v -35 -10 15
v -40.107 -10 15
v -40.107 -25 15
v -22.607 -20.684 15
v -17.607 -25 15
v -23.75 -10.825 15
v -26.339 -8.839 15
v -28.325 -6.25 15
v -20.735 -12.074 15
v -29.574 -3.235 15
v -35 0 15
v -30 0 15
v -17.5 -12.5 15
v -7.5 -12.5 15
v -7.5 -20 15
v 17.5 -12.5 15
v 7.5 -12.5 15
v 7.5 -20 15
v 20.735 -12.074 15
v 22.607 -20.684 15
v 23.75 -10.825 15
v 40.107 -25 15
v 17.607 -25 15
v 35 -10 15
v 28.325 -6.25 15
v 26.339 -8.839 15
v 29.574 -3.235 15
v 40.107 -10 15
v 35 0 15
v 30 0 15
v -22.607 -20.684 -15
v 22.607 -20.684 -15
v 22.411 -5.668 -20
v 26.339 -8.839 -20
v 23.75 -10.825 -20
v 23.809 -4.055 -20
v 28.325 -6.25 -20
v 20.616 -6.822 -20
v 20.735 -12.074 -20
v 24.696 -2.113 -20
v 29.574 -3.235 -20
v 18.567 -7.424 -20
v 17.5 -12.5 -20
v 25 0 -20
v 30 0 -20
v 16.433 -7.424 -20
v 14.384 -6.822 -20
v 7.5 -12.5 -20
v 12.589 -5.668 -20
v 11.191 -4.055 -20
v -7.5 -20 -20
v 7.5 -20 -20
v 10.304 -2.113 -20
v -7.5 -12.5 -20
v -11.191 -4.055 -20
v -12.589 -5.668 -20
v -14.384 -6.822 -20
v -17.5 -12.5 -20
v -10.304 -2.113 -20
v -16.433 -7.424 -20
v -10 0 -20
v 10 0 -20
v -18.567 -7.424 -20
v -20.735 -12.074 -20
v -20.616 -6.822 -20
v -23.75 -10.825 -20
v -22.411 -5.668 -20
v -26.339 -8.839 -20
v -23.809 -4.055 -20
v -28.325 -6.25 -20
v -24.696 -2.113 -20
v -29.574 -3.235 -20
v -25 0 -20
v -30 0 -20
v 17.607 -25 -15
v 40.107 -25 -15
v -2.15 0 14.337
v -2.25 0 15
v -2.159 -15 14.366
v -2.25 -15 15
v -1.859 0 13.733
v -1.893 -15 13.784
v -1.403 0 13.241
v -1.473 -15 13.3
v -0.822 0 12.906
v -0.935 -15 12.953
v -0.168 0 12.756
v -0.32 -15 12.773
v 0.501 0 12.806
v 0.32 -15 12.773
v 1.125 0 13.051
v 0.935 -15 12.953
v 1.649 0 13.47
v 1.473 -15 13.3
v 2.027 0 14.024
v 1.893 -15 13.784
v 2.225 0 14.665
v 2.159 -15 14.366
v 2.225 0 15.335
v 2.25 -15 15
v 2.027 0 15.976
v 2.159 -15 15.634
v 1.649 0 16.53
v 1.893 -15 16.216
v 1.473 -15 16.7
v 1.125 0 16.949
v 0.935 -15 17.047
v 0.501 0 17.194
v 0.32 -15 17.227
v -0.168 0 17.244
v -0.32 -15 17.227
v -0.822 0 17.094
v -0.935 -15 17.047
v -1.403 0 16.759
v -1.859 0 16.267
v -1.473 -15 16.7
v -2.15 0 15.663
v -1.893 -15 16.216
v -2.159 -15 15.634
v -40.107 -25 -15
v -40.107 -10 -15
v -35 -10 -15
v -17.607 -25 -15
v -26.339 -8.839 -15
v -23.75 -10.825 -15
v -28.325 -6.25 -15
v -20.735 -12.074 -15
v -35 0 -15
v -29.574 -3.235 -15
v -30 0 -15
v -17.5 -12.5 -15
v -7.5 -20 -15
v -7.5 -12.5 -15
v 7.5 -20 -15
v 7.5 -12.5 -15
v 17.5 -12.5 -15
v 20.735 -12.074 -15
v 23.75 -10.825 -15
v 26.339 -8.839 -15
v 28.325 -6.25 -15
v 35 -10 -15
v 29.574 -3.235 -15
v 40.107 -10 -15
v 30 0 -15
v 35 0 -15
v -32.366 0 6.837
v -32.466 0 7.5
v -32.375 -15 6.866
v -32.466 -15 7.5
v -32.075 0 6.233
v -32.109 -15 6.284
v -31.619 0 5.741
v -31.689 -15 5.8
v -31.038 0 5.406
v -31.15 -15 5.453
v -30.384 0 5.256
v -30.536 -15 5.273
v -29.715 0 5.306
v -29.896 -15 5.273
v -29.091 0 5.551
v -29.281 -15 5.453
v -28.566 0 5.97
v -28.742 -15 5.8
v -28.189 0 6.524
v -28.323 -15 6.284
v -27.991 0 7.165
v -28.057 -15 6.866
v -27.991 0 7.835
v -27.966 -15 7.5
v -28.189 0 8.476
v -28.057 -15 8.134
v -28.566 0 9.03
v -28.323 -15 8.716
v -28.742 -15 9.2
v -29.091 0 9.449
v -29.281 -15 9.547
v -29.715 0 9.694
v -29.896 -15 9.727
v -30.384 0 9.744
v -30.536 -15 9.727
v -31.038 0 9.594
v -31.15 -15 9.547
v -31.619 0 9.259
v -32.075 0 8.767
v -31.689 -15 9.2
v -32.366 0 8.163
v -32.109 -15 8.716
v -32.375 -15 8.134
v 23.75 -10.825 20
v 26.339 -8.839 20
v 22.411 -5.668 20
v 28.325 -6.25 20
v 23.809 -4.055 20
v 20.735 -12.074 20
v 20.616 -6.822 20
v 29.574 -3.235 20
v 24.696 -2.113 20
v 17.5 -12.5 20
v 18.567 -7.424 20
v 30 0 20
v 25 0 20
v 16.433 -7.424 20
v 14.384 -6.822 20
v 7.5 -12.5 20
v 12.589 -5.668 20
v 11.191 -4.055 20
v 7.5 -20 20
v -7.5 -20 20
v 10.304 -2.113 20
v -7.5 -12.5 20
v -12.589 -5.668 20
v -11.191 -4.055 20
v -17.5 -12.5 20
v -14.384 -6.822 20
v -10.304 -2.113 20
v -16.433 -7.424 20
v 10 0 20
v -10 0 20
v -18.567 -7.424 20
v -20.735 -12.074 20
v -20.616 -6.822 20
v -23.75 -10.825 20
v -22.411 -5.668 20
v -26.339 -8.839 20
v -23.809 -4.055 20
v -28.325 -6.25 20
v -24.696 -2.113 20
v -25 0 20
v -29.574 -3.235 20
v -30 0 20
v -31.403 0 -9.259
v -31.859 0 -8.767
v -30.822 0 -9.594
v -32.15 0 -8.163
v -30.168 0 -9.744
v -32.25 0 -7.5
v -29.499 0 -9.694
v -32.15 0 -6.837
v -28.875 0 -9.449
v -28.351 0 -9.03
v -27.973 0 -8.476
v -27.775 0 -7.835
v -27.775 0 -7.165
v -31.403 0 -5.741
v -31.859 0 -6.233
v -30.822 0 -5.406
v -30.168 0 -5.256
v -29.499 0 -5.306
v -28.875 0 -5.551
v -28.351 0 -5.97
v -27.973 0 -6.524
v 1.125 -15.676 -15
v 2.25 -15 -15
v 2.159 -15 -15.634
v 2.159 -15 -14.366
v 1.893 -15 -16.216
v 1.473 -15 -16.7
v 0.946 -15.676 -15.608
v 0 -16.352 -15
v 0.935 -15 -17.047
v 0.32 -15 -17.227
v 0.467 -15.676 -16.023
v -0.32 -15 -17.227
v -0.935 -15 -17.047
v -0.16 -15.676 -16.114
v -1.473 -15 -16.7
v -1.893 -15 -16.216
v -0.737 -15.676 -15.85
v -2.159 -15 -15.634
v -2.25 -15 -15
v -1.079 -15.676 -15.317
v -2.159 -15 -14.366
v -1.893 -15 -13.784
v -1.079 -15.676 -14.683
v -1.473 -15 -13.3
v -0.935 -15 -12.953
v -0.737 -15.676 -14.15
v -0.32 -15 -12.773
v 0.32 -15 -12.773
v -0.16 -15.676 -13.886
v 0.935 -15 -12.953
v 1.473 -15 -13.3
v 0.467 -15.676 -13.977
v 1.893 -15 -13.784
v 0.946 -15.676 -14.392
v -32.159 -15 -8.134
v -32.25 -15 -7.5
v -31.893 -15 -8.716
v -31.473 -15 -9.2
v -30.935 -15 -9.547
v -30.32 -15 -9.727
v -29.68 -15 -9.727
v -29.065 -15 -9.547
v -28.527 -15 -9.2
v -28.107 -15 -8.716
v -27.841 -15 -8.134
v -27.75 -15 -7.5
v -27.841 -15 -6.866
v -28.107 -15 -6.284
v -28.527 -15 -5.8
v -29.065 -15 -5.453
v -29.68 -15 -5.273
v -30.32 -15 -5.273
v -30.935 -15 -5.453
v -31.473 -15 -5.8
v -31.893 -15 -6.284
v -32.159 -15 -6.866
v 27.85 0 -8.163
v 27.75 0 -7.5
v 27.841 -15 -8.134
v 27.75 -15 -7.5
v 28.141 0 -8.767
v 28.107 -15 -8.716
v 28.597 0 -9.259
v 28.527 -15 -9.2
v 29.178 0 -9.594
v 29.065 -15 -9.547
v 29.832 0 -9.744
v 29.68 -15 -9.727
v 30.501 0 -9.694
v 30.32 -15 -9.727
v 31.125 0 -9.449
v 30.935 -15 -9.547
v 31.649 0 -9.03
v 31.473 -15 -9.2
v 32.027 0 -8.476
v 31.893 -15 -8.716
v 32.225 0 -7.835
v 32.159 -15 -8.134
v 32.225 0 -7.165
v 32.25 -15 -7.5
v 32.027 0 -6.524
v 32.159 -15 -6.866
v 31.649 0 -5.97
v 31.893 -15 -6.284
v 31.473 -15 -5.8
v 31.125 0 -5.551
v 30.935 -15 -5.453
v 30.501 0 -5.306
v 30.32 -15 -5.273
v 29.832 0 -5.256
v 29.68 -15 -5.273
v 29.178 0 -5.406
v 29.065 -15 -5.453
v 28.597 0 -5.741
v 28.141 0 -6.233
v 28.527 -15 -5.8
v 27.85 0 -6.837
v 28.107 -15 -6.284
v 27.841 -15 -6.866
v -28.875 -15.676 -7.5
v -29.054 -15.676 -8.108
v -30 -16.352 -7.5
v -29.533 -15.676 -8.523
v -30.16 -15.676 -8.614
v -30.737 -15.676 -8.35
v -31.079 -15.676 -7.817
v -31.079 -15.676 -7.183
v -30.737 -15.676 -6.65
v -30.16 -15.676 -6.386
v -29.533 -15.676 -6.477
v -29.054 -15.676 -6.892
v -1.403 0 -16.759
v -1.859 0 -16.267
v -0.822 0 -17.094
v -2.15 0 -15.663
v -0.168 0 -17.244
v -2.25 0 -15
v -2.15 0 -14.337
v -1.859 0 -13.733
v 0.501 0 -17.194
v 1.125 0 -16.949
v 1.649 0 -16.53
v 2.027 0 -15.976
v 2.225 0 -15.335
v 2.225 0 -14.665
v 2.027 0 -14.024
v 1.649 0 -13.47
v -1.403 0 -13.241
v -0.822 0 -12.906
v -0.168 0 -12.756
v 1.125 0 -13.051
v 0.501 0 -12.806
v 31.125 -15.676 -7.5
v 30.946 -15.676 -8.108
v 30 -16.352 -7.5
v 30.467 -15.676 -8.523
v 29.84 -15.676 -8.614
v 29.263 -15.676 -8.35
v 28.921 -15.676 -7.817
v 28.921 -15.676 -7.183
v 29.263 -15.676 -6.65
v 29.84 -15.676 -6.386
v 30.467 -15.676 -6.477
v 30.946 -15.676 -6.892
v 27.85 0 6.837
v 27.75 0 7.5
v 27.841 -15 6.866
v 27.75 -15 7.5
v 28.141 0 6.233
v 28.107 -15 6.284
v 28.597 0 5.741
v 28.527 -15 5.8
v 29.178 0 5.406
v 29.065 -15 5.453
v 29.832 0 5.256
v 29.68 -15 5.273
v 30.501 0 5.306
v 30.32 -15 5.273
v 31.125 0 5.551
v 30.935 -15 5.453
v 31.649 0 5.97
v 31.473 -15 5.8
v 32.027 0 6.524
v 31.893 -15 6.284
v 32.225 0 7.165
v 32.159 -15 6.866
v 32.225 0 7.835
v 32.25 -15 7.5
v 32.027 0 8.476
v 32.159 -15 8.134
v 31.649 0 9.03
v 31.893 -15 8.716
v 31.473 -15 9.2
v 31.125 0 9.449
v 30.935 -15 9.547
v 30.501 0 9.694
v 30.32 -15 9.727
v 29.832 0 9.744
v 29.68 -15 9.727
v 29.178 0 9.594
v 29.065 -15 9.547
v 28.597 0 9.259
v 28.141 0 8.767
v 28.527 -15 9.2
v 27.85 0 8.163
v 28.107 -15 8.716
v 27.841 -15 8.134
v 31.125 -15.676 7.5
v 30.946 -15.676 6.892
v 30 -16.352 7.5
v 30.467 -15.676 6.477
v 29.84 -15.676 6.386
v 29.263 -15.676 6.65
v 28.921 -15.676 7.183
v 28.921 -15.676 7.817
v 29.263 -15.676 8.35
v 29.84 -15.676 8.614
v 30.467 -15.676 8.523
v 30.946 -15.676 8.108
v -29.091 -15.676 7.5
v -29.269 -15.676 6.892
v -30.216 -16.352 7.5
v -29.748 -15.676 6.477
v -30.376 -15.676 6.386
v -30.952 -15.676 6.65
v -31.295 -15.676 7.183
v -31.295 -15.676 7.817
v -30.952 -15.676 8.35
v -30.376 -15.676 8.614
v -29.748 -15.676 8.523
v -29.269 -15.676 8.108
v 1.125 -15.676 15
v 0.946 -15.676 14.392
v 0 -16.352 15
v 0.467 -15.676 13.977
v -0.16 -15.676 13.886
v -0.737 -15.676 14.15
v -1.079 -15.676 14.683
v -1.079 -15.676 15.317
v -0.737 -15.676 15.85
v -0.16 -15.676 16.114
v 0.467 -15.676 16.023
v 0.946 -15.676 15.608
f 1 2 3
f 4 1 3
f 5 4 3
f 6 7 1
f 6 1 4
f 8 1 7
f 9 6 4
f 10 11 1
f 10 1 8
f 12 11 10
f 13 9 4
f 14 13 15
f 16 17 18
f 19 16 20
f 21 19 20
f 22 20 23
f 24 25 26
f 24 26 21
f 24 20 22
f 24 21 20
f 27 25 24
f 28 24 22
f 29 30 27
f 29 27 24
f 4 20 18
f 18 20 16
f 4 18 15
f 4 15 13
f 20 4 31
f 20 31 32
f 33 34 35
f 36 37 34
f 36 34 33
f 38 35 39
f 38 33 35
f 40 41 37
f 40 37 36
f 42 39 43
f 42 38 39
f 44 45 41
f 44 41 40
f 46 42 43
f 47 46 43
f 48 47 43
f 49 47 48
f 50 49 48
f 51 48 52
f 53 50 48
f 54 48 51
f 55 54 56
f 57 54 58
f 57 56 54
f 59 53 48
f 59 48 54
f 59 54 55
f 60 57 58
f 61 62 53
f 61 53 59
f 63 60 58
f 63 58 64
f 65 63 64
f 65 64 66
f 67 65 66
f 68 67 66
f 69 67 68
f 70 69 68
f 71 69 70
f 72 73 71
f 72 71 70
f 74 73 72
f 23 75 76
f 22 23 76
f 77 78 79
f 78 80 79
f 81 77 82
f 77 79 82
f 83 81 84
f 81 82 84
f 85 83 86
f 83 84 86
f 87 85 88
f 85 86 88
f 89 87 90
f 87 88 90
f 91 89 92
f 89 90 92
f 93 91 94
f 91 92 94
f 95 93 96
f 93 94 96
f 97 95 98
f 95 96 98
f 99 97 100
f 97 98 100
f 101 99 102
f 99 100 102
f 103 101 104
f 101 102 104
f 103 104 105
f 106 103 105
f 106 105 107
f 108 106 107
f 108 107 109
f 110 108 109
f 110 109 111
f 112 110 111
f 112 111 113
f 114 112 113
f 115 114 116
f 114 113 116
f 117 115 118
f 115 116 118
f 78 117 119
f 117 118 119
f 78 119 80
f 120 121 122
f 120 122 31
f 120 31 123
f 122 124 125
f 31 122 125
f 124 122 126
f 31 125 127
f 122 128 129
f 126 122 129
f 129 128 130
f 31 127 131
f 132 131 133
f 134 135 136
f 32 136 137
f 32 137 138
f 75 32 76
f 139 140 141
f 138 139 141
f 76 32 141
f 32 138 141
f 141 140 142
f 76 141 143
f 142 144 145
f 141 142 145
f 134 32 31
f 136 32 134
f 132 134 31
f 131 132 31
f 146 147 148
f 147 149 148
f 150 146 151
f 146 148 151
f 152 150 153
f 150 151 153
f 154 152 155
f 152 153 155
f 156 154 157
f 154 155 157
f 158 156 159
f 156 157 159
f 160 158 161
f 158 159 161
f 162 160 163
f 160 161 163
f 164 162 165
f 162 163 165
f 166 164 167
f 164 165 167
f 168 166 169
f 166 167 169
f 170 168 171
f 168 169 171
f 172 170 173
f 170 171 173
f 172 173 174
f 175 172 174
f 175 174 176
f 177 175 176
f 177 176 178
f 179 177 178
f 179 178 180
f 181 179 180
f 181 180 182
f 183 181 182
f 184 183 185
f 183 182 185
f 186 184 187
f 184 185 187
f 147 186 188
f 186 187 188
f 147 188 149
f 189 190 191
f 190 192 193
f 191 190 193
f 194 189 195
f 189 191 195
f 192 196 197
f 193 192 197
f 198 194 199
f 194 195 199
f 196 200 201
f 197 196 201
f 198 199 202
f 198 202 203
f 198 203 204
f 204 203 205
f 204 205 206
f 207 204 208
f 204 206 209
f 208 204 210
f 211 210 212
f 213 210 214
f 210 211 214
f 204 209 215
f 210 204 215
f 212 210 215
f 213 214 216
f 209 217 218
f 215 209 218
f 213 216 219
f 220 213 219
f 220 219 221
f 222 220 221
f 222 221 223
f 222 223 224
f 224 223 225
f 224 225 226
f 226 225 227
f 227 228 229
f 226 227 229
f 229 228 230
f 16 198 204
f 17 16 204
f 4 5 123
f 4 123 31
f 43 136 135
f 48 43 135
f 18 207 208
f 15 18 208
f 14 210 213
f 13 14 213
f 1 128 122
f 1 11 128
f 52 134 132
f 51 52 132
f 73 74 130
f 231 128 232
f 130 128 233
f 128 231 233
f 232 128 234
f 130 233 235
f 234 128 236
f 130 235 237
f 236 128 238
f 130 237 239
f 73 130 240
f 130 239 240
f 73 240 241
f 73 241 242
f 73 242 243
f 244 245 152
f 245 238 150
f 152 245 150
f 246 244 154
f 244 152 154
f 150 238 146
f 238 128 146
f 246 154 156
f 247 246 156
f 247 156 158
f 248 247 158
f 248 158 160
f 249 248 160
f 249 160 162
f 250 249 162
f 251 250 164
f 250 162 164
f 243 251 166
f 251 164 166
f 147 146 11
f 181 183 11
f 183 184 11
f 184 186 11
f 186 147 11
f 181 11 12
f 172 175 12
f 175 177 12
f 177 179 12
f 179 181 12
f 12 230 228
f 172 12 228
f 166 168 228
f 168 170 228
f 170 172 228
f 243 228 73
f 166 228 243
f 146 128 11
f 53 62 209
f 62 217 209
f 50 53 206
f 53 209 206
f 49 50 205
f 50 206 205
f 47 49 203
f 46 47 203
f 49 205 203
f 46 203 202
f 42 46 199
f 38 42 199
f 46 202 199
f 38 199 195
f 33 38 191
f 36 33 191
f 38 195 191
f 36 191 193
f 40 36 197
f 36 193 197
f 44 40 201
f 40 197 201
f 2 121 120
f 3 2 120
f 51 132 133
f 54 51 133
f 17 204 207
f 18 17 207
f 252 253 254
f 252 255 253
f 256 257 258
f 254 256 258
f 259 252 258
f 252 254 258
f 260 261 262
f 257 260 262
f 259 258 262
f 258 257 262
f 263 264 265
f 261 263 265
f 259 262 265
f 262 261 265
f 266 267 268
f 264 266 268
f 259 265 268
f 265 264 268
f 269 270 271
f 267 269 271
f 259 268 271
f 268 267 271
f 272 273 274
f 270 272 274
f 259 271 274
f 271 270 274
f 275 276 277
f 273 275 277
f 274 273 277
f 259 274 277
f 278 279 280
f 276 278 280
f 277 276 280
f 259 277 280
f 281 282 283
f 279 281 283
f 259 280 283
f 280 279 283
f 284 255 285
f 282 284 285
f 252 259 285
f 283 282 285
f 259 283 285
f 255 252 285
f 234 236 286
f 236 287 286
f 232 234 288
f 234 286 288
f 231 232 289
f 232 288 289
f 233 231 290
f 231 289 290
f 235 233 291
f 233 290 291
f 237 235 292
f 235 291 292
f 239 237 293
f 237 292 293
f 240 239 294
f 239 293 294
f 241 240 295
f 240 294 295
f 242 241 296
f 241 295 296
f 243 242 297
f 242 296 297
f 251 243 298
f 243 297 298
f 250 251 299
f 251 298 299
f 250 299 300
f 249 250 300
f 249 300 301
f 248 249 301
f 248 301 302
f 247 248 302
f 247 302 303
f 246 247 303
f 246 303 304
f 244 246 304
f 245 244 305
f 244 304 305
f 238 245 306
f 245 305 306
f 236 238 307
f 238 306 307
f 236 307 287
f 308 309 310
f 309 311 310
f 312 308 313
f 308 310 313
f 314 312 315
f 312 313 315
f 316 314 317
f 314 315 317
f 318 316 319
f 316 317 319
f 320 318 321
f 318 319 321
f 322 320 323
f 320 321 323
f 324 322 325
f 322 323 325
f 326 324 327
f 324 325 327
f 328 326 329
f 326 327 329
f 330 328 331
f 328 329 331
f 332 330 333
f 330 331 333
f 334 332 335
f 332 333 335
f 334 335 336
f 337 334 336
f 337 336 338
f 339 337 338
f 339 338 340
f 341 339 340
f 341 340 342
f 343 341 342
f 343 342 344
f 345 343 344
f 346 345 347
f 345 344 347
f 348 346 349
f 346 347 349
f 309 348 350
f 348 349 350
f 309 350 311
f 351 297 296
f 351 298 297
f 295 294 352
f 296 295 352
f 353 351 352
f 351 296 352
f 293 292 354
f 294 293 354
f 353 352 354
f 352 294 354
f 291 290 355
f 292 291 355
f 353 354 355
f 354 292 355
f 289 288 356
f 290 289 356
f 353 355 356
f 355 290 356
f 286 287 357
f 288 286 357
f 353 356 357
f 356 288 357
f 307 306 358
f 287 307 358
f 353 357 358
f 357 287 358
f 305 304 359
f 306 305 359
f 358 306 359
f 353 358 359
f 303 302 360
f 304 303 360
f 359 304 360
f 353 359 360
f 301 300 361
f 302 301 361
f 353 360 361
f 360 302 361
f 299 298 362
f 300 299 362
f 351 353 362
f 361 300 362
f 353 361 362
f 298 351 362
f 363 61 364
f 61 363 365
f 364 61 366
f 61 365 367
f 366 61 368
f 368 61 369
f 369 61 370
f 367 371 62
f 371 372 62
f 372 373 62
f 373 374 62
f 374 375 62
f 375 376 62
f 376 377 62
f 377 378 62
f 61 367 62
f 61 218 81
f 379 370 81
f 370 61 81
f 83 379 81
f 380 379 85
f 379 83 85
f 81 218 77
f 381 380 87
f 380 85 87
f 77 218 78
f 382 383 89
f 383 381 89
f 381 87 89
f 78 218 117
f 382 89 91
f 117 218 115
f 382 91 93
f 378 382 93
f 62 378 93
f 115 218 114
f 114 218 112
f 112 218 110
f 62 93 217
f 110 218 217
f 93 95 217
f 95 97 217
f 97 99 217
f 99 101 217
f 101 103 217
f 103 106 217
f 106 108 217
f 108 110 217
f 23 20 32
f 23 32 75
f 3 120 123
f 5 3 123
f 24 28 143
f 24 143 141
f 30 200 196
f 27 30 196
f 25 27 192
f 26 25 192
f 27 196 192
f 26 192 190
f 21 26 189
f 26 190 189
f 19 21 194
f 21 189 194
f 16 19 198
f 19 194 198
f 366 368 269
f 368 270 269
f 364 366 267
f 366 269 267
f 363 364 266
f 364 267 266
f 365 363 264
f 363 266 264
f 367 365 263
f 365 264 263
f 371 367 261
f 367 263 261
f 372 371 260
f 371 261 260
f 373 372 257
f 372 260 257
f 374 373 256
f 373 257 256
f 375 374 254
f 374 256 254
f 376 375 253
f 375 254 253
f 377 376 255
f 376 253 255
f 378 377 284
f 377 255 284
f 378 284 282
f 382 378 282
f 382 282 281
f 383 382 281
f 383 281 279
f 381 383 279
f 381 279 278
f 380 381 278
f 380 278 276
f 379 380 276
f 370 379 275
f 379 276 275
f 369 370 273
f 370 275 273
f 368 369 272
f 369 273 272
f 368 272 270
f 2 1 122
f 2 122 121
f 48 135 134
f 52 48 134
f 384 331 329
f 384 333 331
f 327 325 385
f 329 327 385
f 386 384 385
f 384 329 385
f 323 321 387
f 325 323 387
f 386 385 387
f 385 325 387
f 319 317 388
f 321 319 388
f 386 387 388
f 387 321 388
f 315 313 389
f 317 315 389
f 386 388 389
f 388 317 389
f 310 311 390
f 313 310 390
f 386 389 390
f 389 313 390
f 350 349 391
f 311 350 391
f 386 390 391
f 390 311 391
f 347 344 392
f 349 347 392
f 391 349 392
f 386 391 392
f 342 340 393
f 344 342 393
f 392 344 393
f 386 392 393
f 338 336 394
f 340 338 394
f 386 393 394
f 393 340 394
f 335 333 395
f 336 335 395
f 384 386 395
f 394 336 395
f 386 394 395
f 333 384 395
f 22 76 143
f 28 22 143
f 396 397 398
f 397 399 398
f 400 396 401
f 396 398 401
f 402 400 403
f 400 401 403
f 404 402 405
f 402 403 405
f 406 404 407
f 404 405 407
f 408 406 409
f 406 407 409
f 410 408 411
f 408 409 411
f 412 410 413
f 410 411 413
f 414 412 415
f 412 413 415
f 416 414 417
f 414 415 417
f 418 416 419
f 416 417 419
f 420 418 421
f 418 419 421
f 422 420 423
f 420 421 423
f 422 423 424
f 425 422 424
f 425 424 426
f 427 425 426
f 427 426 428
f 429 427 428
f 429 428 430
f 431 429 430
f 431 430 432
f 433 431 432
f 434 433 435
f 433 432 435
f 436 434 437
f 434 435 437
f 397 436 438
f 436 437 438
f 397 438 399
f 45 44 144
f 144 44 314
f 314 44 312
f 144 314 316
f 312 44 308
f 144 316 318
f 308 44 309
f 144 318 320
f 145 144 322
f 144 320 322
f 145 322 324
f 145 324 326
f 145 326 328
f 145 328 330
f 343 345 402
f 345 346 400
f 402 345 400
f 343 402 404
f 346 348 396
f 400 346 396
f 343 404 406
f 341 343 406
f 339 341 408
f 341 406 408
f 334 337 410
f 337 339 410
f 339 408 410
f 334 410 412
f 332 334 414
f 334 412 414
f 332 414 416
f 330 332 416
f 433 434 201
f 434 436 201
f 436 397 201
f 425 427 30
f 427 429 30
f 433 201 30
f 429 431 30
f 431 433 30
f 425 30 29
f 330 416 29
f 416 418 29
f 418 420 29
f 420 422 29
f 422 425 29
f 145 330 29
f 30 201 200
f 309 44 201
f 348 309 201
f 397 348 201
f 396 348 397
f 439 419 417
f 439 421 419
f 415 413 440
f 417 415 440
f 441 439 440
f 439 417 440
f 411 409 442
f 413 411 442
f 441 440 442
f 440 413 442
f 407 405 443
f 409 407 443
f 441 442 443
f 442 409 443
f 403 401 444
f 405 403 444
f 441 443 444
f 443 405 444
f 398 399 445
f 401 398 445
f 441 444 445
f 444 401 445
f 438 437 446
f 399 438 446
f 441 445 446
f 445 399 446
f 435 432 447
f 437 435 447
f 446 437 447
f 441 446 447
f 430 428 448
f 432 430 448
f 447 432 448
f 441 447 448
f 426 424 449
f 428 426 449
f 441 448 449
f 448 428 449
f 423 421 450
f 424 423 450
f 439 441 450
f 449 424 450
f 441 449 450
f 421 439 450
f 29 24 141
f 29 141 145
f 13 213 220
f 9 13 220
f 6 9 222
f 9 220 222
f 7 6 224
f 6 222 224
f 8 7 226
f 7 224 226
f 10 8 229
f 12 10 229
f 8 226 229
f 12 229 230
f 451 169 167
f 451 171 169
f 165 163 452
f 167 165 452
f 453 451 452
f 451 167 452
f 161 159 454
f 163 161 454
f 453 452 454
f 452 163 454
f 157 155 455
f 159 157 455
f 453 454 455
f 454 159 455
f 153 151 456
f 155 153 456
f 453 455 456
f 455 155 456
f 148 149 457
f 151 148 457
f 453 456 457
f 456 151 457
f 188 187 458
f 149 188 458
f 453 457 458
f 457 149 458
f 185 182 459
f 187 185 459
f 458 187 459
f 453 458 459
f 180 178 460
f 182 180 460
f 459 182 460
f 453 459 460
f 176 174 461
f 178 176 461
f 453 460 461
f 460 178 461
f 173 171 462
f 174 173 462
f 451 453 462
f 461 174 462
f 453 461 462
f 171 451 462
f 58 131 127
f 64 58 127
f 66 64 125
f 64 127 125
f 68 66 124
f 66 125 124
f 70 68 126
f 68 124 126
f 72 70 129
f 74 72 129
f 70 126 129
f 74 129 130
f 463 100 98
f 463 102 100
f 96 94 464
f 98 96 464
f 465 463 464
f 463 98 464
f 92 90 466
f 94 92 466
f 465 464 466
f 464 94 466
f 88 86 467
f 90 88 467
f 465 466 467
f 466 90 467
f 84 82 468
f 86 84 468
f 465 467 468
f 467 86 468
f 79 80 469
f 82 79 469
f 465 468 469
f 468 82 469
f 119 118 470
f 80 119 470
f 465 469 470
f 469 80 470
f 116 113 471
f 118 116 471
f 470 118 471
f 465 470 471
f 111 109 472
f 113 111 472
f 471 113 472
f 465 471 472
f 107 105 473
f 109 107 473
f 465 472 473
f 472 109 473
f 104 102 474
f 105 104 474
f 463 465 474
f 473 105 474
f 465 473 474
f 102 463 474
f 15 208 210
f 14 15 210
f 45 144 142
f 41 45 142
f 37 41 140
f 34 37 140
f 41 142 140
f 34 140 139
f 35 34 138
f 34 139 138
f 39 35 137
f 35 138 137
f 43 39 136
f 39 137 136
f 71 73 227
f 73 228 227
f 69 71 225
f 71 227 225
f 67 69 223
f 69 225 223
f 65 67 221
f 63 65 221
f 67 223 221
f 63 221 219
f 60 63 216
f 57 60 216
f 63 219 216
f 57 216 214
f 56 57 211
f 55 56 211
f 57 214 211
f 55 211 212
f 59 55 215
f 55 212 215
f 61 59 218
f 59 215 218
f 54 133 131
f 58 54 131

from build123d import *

# Parameters (mm, degrees)
BOSS_EXTRUDE1_DEPTH       = 20
BOSS_EXTRUDE2_DEPTH       = 15
F_3_0MM_DOWEL_HOLE1_D     = 4.5
F_3_0MM_DOWEL_HOLE1_DEPTH = 15
F_3_0MM_DOWEL_HOLE1_TIP   = 1.351936393


with BuildPart() as part:
    # Sketch1 → Boss-Extrude1 (new, symmetric)
    with BuildSketch(Plane.XY):
        with BuildLine():
            Line((-30, 0), (-25, 0))
            ThreePointArc((-25, 0), (-17.5, -7.5), (-10, 0))
            Line((-10, 0), (10, 0))
            ThreePointArc((10, 0), (17.5, -7.5), (25, 0))
            Line((25, 0), (30, 0))
            ThreePointArc((30, 0), (26.338834765, -8.838834765), (17.5, -12.5))
            Line((17.5, -12.5), (7.5, -12.5))
            Line((7.5, -12.5), (7.5, -20))
            Line((7.5, -20), (-7.5, -20))
            Line((-7.5, -20), (-7.5, -12.5))
            Line((-7.5, -12.5), (-17.5, -12.5))
            ThreePointArc((-17.5, -12.5), (-26.338834765, -8.838834765), (-30, 0))
        make_face()
    extrude(amount=BOSS_EXTRUDE1_DEPTH, both=True)

    # Sketch6 → Boss-Extrude2 (add, symmetric)
    with BuildSketch(Plane.XY):
        with BuildLine():
            Line((-35, 0), (-35, -10))
            Line((-35, -10), (-40.106769961, -10))
            Line((-40.106769961, -10), (-40.106769961, -25))
            Line((-40.106769961, -25), (-17.606769961, -25))
            Line((-17.606769961, -25), (-22.606769961, -20.683563485))
            Line((-22.606769961, -20.683563485), (22.606769961, -20.683563485))
            Line((22.606769961, -20.683563485), (17.606769961, -25))
            Line((17.606769961, -25), (40.106769961, -25))
            Line((40.106769961, -25), (40.106769961, -10))
            Line((40.106769961, -10), (35, -10))
            Line((35, -10), (35, 0))
            Line((35, 0), (30, 0))
            ThreePointArc((30, 0), (26.338834765, -8.838834765), (17.5, -12.5))
            Line((17.5, -12.5), (7.5, -12.5))
            Line((7.5, -12.5), (7.5, -20))
            Line((7.5, -20), (-7.5, -20))
            Line((-7.5, -20), (-7.5, -12.5))
            Line((-7.5, -12.5), (-17.5, -12.5))
            ThreePointArc((-17.5, -12.5), (-26.338834765, -8.838834765), (-30, 0))
            Line((-30, 0), (-35, 0))
        make_face()
    extrude(amount=BOSS_EXTRUDE2_DEPTH, both=True)

    # Ø3.0mm Dowel Hole1
    with Locations(Plane(origin=(0, 0, 0), x_dir=(1, 0, 0), z_dir=(0, 1, 0))):
        with Locations((0, 15), (0, -15), (30, 7.5), (30, -7.5), (-30, 7.5), (-30.215711777, -7.5)):
            Hole(F_3_0MM_DOWEL_HOLE1_D / 2, depth=F_3_0MM_DOWEL_HOLE1_DEPTH)
            with Locations((0, 0, -(F_3_0MM_DOWEL_HOLE1_DEPTH + F_3_0MM_DOWEL_HOLE1_TIP / 2))):  # 118° drill point
                Cone(0, F_3_0MM_DOWEL_HOLE1_D / 2, F_3_0MM_DOWEL_HOLE1_TIP, mode=Mode.SUBTRACT)


solid = part.part
